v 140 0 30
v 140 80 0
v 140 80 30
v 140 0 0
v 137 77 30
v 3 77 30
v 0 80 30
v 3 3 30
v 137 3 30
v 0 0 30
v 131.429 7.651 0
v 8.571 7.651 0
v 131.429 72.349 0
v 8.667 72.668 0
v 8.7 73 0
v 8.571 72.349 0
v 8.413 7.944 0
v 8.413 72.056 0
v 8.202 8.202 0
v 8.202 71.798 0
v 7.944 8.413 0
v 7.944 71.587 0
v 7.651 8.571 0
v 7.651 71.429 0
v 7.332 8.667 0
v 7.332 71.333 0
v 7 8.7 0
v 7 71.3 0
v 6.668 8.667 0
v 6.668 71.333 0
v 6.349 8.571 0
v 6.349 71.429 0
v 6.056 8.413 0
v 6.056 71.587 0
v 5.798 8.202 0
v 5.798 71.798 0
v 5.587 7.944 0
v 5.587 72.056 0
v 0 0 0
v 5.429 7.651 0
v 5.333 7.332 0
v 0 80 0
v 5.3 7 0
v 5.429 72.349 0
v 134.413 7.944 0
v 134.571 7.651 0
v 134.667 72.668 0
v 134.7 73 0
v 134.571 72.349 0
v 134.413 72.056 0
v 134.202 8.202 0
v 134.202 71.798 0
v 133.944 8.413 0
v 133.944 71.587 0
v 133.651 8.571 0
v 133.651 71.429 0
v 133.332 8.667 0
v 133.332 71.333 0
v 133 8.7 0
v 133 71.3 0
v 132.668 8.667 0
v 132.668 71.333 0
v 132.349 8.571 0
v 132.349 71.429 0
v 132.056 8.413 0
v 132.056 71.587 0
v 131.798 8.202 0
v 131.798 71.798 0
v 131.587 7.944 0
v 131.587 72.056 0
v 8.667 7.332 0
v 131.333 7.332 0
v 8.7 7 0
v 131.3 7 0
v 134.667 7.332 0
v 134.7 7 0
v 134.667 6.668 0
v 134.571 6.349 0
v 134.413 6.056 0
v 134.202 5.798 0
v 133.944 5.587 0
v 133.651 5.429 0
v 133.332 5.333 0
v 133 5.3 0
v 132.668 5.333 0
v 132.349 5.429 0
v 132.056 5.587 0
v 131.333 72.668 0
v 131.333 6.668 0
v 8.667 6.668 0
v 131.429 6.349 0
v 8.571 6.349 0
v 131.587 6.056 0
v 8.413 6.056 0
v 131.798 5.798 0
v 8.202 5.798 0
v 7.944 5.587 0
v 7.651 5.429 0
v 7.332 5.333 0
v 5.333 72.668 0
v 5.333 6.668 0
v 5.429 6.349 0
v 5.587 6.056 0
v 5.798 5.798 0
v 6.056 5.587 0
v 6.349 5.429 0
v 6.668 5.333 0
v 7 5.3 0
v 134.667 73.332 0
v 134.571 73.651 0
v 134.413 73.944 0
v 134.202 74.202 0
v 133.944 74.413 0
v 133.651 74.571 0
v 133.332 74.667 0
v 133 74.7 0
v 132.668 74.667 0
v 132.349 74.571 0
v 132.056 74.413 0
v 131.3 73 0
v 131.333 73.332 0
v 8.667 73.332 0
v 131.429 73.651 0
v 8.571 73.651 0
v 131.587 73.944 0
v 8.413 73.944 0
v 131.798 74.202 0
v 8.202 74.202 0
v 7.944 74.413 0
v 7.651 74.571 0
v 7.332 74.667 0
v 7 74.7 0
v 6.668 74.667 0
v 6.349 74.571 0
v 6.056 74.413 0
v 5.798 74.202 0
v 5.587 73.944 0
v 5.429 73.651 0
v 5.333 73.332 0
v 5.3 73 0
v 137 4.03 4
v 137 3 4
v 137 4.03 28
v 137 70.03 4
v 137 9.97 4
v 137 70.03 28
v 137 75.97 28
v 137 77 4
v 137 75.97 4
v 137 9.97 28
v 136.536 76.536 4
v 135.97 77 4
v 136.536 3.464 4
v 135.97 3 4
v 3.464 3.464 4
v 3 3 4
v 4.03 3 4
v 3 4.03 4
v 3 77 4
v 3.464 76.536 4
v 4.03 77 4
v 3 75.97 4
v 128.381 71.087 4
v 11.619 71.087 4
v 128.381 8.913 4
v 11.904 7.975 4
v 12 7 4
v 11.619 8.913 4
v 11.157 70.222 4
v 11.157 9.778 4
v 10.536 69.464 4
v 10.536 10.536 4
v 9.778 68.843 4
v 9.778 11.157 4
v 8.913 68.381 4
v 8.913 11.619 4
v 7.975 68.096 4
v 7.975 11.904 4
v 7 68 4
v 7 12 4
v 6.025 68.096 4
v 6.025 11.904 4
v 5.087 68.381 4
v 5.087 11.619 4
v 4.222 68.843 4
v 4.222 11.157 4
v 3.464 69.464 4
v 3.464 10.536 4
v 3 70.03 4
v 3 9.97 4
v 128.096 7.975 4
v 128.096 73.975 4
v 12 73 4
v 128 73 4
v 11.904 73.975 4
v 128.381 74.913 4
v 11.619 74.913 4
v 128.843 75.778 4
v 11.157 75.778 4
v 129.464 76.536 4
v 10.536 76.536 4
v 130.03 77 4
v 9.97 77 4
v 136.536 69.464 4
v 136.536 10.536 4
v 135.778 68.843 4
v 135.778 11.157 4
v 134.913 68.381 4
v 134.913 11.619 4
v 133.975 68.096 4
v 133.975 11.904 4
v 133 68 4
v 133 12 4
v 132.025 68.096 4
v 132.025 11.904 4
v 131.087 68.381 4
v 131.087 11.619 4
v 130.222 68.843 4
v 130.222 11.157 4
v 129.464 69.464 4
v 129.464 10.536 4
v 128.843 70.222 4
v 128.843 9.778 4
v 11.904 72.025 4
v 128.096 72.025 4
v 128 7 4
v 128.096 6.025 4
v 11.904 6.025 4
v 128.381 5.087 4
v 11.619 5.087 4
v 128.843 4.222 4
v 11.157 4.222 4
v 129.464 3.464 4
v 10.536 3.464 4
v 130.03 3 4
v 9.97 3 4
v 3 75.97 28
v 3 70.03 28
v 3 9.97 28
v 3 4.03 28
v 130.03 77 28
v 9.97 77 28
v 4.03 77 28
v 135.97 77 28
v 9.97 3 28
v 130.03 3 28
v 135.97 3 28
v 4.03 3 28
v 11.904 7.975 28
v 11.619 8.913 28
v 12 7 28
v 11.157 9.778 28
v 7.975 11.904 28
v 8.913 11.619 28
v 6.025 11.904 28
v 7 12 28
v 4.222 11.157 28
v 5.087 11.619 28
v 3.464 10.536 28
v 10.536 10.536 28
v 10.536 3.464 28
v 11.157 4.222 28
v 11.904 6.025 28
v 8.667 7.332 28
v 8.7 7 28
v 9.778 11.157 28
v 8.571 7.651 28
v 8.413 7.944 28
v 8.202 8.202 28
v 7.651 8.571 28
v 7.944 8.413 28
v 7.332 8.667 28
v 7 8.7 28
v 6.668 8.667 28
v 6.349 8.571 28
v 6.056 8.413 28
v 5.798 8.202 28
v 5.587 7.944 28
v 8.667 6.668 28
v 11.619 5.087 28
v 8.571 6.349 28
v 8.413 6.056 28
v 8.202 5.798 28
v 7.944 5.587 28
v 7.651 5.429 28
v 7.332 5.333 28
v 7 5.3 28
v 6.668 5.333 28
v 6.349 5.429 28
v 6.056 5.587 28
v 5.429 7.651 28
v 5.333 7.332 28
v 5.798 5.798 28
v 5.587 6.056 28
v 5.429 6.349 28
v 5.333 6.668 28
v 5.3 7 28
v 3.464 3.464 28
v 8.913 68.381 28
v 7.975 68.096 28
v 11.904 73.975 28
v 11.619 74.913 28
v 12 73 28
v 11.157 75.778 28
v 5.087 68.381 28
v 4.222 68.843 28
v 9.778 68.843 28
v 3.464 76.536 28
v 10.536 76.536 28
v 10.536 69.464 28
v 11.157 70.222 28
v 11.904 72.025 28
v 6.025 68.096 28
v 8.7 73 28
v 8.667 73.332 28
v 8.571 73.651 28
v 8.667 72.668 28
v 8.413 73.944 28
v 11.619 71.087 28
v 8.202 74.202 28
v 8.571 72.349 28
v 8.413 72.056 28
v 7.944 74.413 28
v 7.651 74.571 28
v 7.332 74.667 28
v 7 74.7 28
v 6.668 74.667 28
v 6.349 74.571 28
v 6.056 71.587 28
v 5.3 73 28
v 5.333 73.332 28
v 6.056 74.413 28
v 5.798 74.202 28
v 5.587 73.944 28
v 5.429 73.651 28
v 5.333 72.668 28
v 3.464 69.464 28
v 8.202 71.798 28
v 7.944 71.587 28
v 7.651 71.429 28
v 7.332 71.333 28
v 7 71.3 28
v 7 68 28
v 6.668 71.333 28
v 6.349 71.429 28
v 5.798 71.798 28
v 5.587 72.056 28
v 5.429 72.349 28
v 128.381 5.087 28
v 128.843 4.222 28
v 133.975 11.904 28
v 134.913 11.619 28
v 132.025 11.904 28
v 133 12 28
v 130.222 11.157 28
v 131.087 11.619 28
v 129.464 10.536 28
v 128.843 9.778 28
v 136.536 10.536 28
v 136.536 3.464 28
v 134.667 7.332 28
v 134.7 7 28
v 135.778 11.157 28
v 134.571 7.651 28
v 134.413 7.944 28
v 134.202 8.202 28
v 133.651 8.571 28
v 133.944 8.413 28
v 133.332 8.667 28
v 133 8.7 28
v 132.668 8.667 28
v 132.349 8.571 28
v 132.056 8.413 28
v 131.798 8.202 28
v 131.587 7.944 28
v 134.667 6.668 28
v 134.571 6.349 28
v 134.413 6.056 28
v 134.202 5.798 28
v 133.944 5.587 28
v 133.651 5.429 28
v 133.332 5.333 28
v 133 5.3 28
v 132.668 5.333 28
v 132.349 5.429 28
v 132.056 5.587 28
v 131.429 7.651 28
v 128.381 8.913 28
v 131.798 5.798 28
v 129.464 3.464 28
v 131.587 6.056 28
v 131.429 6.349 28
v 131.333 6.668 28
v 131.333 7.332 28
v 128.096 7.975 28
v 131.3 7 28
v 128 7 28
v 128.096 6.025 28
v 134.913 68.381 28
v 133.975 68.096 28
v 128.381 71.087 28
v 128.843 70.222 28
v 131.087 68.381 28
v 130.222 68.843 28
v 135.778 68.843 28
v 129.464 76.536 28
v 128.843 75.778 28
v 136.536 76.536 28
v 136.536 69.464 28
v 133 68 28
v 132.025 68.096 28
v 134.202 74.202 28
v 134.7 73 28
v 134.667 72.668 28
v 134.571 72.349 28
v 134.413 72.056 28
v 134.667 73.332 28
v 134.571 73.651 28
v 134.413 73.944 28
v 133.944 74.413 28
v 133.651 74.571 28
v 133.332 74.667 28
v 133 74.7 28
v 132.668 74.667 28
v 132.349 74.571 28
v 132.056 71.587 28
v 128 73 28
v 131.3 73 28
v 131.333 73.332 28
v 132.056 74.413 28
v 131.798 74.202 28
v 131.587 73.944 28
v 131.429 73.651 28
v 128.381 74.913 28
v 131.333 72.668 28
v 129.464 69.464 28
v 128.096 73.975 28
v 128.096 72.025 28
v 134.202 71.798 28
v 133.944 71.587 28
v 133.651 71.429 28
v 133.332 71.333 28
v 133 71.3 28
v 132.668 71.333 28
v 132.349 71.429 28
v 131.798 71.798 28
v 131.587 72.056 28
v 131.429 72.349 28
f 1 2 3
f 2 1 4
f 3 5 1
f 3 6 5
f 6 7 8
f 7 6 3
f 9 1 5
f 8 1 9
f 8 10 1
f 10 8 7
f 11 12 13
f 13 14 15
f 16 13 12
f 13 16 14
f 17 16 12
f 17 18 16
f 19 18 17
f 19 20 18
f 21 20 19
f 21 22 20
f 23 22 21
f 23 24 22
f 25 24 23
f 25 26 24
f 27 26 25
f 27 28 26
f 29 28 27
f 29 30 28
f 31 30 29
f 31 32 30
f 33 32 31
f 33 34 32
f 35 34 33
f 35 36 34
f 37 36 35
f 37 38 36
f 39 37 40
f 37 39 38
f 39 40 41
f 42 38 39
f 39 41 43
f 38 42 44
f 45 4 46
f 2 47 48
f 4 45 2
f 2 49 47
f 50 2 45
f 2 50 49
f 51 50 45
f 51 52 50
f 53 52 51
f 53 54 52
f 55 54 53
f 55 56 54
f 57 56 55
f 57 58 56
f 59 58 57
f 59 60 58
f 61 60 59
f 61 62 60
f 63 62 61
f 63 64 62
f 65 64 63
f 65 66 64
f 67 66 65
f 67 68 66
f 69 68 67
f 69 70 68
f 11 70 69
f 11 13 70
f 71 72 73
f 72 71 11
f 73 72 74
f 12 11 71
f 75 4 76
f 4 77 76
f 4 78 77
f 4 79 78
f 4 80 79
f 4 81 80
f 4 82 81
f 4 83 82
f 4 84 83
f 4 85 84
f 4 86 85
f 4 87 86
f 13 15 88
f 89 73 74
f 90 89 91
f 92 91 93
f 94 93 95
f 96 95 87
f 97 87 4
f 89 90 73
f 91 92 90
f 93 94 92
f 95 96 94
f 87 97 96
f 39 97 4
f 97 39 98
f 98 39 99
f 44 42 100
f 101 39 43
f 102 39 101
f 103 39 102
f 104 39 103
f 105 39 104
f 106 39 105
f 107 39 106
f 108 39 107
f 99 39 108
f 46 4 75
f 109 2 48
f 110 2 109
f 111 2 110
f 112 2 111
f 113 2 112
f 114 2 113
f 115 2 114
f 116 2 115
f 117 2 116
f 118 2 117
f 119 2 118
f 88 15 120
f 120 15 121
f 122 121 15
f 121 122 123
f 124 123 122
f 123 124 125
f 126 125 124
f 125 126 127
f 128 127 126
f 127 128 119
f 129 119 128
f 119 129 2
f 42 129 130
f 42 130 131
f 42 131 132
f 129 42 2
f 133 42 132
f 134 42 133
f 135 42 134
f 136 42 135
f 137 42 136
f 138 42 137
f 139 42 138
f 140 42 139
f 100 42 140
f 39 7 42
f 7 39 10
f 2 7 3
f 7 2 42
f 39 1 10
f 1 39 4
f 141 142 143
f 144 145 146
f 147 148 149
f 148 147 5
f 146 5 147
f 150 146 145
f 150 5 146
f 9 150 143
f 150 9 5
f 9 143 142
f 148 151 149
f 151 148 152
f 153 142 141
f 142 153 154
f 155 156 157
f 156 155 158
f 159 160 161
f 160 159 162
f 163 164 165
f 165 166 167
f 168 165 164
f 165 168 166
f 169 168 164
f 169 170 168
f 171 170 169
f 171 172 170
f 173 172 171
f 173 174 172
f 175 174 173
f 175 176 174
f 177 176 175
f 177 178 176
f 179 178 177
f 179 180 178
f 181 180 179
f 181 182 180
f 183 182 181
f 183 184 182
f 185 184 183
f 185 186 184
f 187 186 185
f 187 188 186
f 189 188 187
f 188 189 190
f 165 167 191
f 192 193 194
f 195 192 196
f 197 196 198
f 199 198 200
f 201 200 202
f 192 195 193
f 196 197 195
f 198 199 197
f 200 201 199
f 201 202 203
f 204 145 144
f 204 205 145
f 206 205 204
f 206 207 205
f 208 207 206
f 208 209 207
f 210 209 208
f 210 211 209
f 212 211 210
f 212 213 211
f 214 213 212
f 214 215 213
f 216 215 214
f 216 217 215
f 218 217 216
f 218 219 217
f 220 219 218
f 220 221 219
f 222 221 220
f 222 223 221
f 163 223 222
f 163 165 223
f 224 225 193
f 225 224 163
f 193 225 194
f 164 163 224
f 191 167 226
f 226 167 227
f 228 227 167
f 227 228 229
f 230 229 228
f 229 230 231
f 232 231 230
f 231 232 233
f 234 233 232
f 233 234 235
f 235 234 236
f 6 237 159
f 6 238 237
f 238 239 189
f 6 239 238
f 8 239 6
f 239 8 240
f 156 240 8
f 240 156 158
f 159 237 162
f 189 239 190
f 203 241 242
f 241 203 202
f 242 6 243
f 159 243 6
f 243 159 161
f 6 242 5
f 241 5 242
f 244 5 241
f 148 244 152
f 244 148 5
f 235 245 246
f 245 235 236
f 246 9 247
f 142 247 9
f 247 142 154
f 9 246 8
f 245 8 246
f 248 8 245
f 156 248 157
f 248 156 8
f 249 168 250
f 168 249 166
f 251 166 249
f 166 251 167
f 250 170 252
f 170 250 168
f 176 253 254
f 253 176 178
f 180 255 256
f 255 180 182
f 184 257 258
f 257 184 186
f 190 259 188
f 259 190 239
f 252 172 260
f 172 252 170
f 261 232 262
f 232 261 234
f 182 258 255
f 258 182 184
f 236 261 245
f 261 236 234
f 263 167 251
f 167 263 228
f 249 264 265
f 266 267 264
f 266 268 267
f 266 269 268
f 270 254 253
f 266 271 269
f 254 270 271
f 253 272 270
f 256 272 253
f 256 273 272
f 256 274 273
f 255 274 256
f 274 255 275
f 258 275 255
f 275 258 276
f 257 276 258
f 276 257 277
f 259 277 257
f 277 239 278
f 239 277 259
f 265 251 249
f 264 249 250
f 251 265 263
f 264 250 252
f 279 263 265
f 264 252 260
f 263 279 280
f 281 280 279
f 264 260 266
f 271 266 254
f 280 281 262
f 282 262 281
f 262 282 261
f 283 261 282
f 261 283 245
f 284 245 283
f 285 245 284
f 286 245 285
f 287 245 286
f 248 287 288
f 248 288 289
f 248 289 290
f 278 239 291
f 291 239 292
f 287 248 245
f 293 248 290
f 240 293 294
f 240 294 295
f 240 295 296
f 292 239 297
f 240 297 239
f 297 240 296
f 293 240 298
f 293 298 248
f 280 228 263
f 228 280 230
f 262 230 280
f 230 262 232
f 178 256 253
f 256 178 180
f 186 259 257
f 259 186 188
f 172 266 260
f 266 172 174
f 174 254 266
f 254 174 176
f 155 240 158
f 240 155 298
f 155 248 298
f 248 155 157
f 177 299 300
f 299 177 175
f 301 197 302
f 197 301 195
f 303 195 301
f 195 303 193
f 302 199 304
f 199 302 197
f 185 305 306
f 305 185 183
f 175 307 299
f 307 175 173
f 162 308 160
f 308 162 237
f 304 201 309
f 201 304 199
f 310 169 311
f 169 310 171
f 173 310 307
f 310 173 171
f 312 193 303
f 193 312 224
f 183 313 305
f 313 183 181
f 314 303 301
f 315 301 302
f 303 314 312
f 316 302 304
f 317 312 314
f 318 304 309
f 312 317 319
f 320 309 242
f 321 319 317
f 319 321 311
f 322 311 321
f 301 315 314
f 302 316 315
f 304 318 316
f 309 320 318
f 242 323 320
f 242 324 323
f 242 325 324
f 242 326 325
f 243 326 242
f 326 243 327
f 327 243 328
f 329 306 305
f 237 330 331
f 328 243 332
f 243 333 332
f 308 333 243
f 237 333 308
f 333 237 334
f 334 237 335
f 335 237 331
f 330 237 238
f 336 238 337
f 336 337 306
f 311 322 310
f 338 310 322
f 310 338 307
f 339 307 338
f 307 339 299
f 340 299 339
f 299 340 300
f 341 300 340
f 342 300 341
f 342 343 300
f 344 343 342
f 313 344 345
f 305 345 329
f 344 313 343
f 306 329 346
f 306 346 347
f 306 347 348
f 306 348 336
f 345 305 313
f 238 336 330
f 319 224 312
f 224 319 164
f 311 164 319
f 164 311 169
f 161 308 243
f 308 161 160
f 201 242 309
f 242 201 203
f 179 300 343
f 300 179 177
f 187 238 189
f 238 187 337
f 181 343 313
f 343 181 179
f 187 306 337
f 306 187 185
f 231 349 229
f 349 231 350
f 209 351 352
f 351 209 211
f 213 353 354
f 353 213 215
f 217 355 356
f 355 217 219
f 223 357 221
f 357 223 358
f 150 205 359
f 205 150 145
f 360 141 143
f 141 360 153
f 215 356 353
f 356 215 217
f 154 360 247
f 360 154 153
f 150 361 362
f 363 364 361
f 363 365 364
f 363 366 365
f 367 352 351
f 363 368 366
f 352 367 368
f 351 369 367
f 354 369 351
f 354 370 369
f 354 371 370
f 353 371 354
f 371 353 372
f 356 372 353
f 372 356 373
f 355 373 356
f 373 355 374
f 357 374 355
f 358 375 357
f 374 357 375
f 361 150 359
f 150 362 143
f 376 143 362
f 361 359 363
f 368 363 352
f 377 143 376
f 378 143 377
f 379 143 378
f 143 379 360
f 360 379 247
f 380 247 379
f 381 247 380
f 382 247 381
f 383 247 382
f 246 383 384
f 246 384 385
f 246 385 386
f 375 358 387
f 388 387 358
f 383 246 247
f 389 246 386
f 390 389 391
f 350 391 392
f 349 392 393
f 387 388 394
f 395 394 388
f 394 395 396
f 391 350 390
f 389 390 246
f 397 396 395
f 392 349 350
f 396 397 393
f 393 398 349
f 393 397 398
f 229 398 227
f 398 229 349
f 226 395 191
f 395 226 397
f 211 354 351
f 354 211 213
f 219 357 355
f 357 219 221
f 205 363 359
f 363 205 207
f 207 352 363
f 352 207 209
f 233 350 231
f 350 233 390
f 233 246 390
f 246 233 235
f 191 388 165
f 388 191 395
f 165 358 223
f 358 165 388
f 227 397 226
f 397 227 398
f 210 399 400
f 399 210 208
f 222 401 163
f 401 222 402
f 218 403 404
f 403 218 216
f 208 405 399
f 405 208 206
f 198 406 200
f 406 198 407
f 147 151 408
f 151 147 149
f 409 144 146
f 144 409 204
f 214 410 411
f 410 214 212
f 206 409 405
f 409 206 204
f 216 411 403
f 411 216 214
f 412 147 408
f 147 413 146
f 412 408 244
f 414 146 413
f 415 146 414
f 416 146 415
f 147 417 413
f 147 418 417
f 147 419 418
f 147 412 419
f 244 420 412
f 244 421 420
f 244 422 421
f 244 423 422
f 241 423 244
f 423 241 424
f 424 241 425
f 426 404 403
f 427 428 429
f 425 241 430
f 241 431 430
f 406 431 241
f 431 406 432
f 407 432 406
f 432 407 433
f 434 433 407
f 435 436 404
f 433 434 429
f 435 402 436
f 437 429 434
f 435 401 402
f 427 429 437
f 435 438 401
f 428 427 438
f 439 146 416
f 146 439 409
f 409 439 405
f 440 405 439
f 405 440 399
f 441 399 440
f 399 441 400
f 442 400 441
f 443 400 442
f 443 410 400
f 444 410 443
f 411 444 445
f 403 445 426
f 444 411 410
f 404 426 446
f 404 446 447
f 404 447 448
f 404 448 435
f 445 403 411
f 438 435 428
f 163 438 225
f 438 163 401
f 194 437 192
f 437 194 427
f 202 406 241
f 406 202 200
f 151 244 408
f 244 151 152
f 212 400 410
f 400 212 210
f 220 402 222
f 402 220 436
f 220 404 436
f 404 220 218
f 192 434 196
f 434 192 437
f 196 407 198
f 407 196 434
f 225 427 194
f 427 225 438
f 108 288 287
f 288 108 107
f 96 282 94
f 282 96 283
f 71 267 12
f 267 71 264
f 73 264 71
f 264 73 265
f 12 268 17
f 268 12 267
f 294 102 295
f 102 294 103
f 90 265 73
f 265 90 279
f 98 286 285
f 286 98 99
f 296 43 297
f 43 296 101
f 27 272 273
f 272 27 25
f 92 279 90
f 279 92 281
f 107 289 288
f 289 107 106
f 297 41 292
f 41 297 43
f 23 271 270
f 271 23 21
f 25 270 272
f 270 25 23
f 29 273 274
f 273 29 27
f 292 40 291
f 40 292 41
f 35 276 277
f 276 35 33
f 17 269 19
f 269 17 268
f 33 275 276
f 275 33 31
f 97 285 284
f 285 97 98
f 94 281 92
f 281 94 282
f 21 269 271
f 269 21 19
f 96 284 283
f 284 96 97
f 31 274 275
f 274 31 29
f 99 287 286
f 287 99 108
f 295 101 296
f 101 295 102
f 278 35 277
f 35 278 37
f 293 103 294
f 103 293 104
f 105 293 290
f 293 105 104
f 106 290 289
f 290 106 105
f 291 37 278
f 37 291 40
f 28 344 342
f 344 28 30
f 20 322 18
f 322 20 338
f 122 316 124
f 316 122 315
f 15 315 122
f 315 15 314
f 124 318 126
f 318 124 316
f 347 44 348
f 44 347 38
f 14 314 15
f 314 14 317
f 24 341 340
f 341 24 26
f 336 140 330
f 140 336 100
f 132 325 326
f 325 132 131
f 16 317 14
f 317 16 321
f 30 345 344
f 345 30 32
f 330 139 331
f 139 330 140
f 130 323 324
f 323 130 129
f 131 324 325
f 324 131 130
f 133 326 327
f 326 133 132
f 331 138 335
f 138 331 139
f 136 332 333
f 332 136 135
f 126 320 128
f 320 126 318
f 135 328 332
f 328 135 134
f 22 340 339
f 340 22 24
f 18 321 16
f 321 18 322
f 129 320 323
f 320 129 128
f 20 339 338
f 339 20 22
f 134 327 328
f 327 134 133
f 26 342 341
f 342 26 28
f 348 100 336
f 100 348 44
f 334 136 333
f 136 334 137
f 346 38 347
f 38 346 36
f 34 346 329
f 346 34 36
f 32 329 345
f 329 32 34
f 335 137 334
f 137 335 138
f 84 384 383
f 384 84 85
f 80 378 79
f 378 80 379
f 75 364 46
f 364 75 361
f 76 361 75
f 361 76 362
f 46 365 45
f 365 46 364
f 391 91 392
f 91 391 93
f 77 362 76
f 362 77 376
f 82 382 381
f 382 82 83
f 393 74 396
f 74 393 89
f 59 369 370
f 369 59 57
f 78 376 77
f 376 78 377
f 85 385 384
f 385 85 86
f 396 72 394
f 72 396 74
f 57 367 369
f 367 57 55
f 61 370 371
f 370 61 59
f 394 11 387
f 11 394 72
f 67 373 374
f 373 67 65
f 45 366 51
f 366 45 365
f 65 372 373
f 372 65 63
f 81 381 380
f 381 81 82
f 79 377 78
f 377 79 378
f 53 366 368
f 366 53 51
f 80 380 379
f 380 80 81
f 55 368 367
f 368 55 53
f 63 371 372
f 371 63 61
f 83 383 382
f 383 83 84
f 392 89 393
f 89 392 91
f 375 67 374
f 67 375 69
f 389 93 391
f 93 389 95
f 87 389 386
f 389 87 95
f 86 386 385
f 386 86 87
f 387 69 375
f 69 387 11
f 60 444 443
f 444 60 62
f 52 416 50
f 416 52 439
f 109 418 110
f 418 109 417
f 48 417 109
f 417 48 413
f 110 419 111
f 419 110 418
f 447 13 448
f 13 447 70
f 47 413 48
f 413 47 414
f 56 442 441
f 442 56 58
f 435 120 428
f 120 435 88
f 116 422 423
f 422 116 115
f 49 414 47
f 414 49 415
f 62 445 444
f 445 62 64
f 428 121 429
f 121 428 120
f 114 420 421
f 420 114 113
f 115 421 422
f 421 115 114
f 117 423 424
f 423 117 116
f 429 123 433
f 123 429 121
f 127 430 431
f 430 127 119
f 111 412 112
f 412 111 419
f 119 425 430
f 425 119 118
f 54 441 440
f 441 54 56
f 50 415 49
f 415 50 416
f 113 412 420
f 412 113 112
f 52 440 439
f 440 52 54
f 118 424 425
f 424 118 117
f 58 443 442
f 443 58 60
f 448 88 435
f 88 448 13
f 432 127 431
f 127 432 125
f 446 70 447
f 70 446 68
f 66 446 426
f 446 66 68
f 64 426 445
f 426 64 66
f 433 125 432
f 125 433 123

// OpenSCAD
$fn = 32;

// ----------------------------------------------------------------------
// Enclosure body: 140 x 80 x 30 mm, wall 3 mm
// ----------------------------------------------------------------------

// --- parameters (mm) ---
length = 140;             // outside length, X
width = 80;               // outside width, Y
height = 30;              // outside height, Z
wall = 3;                 // side wall thickness
floor_t = 4;              // floor thickness
boss_d = 10;              // corner boss diameter
boss_h = 24;              // corner boss height above the floor
boss_hole_d = 3.4;        // lid screw clearance in the boss
boss_lip = 7;             // boss centre inset from the corner

module shell() {
  difference() {
    cube([length, width, height]);
    /* hollow, open at the top */
    translate([wall, wall, floor_t])
      cube([length - 2 * wall, width - 2 * wall, height]);
  }
}

module bosses() {
  /* corner bosses, sunk 1 mm into the floor */
  for (sx = [0, 1]) for (sy = [0, 1])
    translate([sx * (length - 2 * boss_lip) + boss_lip, sy * (width - 2 * boss_lip) + boss_lip, floor_t - 1])
      cylinder(h = boss_h + 1, d = boss_d);
}

difference() {
  union() {
    shell();
    bosses();
  }
  /* boss screw holes */
  for (sx = [0, 1]) for (sy = [0, 1])
    translate([sx * (length - 2 * boss_lip) + boss_lip, sy * (width - 2 * boss_lip) + boss_lip, -1]) cylinder(h = floor_t + boss_h + 2, d = boss_hole_d);
}
